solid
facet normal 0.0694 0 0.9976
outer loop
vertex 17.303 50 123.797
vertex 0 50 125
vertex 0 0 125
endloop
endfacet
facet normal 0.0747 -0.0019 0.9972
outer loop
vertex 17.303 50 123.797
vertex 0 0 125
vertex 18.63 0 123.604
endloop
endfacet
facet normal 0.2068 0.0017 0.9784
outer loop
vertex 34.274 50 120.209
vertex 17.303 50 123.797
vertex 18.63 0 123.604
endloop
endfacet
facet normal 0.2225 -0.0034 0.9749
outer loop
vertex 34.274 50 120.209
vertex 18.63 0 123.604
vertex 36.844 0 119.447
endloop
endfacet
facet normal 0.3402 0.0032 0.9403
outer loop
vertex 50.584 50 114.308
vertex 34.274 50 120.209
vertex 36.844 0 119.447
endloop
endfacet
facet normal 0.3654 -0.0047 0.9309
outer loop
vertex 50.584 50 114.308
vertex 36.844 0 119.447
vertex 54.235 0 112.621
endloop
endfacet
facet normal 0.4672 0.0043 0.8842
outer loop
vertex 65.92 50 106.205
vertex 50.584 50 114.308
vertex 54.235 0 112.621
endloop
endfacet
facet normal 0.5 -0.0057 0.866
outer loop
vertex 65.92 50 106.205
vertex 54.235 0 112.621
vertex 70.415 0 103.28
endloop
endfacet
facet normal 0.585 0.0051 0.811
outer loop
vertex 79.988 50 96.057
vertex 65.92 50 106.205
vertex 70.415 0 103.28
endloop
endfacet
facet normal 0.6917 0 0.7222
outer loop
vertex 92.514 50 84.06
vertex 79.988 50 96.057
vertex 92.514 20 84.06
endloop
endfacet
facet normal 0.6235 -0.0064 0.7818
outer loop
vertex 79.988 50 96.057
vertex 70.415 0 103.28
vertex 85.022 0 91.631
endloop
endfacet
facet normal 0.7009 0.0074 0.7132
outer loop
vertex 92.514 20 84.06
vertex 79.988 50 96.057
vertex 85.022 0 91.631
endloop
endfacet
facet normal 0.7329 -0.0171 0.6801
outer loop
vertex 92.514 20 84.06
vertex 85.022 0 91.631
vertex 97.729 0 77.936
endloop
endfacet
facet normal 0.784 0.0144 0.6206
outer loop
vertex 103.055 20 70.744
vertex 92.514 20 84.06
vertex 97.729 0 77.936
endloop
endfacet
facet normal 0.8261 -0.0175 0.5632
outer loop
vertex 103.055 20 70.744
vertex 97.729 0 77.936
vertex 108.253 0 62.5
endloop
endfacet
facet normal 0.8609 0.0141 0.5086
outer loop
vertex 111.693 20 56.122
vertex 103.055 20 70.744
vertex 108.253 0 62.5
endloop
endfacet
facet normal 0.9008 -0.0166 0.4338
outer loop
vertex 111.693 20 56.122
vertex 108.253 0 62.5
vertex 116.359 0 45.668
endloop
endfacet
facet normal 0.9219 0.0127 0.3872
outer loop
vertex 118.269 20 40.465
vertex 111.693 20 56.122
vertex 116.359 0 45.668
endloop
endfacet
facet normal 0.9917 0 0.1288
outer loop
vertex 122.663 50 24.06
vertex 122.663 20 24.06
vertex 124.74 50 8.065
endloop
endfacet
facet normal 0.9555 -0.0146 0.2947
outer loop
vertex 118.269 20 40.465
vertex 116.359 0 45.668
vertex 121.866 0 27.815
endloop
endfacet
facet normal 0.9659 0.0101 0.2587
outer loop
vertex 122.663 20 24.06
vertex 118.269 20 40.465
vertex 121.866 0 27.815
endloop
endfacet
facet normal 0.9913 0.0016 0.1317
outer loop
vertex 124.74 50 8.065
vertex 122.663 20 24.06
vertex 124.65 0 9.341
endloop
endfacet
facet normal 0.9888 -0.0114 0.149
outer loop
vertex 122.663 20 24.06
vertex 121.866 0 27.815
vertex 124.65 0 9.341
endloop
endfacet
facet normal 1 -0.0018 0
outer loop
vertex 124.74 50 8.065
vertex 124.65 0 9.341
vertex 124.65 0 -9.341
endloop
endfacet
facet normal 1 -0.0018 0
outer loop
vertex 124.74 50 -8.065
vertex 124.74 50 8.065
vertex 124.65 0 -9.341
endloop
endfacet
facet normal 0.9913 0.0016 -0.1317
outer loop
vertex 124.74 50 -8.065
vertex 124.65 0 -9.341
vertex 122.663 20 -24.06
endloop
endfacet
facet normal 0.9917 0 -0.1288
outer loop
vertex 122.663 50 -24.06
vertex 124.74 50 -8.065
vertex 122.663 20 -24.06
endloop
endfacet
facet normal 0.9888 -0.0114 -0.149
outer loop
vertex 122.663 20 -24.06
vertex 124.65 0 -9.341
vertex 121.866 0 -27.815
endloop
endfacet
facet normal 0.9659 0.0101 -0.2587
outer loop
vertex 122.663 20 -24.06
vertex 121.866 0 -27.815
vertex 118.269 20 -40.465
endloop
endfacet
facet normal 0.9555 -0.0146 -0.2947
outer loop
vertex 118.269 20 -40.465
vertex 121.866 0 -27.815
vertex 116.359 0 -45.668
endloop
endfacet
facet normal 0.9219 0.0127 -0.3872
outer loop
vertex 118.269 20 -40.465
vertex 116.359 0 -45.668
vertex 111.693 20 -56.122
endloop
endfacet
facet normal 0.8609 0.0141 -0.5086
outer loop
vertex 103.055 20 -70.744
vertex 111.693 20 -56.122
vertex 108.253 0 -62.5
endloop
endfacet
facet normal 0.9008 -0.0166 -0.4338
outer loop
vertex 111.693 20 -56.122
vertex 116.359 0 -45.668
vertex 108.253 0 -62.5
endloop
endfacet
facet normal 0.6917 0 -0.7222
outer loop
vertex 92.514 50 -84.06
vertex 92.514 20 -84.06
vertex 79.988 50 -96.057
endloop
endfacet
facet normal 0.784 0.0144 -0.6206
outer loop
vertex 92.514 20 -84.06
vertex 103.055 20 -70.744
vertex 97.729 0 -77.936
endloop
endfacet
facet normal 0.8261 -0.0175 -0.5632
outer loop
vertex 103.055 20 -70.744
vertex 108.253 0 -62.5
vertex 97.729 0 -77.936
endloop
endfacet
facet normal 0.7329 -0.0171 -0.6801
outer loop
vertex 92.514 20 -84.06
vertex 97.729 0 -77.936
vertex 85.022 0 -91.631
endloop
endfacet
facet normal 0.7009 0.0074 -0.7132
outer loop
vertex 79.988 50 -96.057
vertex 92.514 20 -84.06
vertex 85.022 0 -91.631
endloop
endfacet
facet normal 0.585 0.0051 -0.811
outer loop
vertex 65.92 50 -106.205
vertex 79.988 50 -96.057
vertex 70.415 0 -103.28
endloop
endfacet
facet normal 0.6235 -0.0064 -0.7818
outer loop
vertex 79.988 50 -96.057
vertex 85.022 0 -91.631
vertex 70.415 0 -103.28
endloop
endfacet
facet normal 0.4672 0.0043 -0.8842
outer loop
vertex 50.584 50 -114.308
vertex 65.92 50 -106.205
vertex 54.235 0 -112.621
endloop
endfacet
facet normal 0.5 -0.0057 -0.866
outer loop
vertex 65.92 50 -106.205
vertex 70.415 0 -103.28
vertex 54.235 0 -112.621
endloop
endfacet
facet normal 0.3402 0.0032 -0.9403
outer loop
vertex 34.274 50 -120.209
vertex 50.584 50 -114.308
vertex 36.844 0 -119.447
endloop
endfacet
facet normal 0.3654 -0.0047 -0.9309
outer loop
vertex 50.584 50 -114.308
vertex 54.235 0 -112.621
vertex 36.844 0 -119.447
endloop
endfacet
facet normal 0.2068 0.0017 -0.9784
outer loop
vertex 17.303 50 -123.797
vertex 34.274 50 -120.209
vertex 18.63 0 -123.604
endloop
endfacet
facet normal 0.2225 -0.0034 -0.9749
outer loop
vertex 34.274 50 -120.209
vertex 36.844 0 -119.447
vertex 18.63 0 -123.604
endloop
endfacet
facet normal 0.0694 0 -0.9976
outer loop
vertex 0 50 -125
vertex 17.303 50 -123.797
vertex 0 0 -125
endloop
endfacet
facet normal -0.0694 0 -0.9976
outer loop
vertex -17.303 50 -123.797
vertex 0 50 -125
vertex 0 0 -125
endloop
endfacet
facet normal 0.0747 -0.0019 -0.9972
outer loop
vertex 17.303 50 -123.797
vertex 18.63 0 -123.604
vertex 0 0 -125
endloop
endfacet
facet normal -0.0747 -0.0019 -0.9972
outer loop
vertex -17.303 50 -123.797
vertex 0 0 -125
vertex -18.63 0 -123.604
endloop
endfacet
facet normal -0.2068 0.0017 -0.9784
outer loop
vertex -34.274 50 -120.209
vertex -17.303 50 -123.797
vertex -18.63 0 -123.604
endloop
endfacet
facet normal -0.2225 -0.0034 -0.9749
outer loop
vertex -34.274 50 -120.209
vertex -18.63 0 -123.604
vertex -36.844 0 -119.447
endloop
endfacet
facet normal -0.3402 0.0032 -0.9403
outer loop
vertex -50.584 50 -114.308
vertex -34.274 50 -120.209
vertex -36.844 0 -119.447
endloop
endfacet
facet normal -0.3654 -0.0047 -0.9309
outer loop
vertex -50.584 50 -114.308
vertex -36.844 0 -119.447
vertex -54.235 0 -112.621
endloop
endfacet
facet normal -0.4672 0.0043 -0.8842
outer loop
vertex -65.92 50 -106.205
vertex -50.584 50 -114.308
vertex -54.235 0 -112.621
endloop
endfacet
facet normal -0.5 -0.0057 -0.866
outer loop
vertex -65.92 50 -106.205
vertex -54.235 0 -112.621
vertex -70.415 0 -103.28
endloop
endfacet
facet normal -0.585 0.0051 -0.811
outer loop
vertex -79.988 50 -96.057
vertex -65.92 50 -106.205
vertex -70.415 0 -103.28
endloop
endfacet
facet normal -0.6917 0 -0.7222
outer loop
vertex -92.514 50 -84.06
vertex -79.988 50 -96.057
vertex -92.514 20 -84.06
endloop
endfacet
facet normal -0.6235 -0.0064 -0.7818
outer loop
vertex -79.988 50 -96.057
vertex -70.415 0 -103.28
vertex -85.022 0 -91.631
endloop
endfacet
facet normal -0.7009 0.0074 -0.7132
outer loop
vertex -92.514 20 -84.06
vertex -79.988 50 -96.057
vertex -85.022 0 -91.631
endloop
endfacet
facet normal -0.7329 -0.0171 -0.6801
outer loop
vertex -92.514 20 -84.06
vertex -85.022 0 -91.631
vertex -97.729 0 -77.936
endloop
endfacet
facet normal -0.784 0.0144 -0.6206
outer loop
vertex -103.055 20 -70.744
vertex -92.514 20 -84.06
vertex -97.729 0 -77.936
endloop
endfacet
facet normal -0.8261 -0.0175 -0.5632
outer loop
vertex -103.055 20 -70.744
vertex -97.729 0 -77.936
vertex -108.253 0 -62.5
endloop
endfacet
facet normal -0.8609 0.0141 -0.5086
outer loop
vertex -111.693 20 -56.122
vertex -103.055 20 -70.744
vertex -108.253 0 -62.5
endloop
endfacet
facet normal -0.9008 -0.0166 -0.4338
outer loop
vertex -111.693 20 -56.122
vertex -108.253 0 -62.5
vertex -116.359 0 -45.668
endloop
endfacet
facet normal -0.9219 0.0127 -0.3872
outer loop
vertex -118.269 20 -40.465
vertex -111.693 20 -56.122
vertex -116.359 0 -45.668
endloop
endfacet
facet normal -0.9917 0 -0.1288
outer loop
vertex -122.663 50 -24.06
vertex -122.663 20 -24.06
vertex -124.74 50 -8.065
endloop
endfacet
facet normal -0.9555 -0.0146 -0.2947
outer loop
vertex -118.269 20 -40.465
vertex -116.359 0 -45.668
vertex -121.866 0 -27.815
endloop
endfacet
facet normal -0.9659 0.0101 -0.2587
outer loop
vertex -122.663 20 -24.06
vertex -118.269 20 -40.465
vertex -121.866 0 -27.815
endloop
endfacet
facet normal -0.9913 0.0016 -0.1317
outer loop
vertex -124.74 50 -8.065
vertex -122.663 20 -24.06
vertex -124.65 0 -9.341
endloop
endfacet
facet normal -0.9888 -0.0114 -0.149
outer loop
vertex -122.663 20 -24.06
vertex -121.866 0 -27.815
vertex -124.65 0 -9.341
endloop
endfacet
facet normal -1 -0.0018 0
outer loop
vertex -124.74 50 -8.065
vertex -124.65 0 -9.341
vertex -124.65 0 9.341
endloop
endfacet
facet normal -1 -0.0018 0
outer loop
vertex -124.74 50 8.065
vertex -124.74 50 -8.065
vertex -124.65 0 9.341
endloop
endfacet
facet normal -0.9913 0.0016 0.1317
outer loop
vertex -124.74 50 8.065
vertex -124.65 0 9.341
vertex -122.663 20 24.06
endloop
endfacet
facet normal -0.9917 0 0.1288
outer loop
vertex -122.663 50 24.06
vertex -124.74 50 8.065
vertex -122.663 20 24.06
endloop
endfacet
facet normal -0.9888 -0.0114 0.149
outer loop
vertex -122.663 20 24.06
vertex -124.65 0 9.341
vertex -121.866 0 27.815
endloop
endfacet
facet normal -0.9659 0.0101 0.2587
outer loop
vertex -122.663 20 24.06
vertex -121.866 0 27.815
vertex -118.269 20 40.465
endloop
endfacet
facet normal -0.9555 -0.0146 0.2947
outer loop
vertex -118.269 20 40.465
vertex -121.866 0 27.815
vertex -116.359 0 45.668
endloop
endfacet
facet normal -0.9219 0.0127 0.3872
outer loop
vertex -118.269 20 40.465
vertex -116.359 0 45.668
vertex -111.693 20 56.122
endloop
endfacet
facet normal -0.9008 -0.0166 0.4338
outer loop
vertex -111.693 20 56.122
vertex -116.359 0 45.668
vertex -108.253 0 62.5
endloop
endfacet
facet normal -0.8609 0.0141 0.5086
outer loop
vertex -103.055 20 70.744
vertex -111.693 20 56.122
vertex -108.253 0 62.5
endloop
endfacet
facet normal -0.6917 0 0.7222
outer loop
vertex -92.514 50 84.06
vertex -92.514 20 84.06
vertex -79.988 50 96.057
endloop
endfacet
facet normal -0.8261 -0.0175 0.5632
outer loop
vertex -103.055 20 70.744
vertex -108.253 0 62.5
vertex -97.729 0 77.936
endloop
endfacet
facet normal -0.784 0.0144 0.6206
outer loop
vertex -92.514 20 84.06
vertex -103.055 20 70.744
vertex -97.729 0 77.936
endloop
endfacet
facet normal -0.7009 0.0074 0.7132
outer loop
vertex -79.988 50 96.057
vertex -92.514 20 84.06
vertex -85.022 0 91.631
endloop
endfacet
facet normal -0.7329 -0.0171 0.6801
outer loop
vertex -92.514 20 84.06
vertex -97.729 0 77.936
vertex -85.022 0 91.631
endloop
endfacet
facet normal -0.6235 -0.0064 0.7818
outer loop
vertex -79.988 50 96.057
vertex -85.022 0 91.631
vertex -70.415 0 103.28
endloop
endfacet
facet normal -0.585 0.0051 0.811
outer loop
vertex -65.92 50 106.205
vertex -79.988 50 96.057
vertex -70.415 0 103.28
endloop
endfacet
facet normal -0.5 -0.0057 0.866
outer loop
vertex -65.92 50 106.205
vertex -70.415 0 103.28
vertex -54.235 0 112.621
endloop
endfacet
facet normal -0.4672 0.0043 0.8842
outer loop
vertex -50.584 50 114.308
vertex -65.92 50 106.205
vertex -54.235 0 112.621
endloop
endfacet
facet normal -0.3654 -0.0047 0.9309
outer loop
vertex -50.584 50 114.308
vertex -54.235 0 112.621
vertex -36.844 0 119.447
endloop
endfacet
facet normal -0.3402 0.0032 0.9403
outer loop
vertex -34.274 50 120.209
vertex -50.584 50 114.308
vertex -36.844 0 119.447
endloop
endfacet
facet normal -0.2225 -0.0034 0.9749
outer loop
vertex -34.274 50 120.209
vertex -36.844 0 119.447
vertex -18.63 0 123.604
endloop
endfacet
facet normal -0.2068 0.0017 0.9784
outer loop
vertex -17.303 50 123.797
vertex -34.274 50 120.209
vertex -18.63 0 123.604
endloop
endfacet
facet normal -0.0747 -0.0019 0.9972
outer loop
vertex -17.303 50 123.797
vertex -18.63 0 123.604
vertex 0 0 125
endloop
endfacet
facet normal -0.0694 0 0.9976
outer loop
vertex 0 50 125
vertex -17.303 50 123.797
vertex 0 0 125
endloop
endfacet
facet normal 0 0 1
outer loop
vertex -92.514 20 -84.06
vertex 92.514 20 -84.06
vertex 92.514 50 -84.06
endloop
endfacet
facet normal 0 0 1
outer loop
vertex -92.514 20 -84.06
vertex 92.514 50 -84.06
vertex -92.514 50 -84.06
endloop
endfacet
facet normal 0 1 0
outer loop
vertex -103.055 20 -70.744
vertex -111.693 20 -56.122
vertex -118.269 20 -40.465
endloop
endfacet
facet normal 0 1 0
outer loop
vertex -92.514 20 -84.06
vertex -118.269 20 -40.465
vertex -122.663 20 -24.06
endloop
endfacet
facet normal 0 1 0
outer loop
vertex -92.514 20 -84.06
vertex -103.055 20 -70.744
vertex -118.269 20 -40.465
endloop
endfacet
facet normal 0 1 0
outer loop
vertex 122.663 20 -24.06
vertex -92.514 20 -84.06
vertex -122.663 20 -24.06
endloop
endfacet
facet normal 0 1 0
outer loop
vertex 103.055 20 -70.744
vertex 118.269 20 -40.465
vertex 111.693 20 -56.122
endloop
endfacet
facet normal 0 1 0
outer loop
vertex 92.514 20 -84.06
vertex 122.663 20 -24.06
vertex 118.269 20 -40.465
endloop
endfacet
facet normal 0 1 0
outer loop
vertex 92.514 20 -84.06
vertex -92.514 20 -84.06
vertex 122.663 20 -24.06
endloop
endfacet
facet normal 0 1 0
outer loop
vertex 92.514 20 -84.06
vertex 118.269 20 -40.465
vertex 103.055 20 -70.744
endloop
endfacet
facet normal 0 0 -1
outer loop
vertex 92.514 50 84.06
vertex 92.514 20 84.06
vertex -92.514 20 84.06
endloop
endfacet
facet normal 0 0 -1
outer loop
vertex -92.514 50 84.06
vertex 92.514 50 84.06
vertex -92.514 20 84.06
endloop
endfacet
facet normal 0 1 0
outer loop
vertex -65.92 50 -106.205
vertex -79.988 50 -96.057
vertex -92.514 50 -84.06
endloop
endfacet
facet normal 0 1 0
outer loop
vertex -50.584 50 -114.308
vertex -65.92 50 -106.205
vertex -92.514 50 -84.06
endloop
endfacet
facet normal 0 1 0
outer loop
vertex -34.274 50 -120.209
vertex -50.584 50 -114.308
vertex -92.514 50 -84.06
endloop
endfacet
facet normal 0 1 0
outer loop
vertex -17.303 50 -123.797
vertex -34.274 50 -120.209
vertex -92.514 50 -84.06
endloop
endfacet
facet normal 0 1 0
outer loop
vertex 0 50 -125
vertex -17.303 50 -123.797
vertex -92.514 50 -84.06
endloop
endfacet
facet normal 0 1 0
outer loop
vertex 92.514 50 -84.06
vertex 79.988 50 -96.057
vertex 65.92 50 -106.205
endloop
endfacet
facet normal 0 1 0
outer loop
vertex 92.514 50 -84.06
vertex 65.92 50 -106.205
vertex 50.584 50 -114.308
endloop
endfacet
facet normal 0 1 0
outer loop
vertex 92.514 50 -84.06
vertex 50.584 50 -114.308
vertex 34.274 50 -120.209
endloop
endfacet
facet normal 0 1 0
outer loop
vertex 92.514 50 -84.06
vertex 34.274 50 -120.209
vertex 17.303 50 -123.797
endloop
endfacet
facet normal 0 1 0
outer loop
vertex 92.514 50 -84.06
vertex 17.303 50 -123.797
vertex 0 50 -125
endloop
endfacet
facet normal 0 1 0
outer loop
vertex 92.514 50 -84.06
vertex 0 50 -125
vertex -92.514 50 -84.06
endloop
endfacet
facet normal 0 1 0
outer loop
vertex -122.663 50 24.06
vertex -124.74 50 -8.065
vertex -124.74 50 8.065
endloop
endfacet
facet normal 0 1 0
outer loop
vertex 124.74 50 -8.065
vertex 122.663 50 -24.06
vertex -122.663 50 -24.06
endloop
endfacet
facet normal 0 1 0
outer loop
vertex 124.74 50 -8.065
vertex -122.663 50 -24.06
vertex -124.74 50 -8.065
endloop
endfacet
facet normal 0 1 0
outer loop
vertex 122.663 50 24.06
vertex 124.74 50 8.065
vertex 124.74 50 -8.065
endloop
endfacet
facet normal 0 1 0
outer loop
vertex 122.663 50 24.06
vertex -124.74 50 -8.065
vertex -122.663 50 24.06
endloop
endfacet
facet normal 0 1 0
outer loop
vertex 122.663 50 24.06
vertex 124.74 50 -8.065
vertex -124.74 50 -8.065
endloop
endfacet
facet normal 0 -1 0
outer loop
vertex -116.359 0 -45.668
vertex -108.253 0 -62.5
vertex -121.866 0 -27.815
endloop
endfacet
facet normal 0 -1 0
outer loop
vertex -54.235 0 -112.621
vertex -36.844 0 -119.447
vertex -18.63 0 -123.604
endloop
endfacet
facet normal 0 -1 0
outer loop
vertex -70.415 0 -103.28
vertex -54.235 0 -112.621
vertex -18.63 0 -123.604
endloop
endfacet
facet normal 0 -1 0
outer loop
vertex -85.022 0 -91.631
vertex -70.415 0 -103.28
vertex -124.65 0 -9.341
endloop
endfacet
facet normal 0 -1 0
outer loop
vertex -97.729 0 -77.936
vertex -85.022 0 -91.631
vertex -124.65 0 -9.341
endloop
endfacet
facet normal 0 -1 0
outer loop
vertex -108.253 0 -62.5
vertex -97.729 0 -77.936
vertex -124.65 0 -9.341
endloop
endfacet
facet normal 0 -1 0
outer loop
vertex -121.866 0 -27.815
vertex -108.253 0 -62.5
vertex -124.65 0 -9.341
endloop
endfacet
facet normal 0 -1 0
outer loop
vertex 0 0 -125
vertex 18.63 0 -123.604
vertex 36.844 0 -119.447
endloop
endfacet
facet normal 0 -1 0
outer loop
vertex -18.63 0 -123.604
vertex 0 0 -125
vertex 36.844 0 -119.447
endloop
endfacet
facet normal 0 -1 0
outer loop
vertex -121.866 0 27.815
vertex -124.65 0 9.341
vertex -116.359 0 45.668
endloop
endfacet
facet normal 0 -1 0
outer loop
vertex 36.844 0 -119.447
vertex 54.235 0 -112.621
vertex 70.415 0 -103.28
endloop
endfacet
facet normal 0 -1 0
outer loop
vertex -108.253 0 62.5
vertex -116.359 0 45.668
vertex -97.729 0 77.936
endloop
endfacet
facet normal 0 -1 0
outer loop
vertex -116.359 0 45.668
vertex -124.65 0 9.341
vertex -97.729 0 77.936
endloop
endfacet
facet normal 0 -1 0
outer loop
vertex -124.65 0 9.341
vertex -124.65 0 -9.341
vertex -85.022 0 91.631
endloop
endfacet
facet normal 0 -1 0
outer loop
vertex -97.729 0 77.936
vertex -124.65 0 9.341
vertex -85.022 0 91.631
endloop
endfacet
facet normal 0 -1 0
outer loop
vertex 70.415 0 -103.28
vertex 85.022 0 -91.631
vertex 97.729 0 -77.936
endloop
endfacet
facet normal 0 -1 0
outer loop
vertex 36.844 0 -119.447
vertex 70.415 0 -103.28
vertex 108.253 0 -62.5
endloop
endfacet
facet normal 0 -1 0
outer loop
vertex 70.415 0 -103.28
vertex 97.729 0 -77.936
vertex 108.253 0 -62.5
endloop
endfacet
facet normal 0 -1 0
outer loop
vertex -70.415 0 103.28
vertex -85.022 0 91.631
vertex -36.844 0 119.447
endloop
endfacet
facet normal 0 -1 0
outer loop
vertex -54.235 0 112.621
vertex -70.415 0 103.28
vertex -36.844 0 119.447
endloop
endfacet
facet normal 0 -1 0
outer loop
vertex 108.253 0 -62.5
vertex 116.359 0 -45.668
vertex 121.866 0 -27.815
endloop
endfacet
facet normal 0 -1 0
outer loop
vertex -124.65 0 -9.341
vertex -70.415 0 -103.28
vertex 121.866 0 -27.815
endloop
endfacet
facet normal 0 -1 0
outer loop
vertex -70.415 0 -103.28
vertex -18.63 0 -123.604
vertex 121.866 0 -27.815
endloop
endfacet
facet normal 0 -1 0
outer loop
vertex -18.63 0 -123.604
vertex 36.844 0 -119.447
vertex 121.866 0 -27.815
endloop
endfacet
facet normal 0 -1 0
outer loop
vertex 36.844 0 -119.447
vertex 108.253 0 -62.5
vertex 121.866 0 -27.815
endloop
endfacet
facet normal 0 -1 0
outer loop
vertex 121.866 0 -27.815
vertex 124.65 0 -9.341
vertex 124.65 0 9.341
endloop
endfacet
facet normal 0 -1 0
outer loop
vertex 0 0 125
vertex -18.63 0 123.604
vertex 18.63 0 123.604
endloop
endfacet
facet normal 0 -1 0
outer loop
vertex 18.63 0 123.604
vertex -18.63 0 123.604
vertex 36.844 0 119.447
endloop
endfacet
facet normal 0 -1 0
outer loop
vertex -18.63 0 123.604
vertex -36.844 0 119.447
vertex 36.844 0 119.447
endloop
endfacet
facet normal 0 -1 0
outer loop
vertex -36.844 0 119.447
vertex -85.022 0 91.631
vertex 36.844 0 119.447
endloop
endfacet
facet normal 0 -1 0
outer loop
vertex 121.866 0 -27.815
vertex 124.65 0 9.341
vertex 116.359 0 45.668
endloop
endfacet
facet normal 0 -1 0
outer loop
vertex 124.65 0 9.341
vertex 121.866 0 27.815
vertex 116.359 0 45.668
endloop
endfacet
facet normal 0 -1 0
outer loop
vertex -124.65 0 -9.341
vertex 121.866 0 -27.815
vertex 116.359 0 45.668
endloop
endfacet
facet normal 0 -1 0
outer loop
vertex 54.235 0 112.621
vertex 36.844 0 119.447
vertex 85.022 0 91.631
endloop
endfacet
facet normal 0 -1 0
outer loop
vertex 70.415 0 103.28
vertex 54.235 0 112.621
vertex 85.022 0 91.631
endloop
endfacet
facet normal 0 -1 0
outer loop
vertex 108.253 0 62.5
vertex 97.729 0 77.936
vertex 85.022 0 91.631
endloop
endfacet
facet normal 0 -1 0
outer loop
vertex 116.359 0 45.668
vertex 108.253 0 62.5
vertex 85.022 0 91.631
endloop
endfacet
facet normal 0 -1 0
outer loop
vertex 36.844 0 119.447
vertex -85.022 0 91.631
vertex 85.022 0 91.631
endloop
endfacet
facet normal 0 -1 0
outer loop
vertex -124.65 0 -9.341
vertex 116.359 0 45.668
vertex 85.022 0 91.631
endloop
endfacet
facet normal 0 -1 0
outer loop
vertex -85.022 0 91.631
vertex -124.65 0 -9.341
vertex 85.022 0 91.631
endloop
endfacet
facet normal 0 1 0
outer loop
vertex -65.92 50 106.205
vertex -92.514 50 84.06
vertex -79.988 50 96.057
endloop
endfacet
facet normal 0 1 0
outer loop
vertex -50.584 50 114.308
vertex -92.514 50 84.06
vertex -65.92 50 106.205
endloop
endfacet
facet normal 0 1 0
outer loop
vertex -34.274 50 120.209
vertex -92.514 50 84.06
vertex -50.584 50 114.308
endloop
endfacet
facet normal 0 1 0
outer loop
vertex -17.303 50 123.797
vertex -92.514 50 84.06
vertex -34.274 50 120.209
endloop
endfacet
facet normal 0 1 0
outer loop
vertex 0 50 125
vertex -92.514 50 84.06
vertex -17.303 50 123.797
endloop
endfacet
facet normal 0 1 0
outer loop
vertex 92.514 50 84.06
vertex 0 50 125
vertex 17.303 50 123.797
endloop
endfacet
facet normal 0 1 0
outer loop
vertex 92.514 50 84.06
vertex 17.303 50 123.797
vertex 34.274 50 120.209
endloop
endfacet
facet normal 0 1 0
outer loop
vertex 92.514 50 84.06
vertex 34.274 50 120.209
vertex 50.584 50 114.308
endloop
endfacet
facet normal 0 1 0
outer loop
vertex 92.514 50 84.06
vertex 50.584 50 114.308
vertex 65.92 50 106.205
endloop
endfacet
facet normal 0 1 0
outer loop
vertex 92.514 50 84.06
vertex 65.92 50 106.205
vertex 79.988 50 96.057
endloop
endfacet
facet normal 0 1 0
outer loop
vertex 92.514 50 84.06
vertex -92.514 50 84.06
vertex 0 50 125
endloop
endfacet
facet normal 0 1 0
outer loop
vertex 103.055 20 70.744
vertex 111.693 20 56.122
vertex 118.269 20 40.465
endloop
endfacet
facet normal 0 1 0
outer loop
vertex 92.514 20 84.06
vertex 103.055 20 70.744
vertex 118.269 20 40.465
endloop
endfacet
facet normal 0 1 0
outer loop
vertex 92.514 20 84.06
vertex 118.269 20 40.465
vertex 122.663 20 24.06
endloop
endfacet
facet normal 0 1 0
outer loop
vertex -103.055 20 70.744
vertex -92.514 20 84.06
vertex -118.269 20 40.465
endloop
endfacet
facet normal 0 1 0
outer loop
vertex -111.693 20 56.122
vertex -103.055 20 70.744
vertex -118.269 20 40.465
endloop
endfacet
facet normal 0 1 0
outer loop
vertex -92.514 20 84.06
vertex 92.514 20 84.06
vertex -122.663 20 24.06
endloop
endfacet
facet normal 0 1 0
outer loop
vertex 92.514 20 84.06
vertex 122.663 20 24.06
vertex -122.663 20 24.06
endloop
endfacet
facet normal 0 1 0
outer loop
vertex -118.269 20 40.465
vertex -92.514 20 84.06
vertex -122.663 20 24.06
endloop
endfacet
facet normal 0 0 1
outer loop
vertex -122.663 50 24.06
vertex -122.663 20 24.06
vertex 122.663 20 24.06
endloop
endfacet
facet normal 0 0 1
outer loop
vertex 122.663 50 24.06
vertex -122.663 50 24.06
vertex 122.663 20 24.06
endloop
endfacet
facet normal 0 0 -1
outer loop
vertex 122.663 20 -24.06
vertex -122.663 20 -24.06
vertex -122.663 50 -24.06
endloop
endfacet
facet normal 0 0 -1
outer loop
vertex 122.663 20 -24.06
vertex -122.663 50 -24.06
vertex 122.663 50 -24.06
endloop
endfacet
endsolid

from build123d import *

# Parameters (mm, degrees)
SKETCH2_R           = 125
BOSS_EXTRUDE1_DEPTH = 50
CUT_EXTRUDE1_START  = -30
CUT_EXTRUDE1_DEPTH  = 30


with BuildPart() as part:
    # Sketch2 → Boss-Extrude1 (new body)
    with BuildSketch(Plane(origin=(0, 0, 0), x_dir=(1, 0, 0), z_dir=(0, 1, 0))):
        with Locations(Location((0, 0, 0), (0, 0, 270))):
            Circle(SKETCH2_R)
    extrude(amount=BOSS_EXTRUDE1_DEPTH)

    # Sketch3 → Cut-Extrude1 (cut)
    with BuildSketch(Plane(origin=(0, 50, 0), x_dir=(1, 0, 0), z_dir=(0, 1, 0)).offset(CUT_EXTRUDE1_START)):
        with BuildLine():
            Line((-122.662612071, 24.06), (122.662612071, 24.06))
            ThreePointArc((122.662612071, 24.06), (111.692828355, 56.122295874), (92.51441185, 84.06))
            Line((92.51441185, 84.06), (-92.51441185, 84.06))
            ThreePointArc((-92.51441185, 84.06), (-111.692828355, 56.122295874), (-122.662612071, 24.06))
        make_face()
        with BuildLine():
            Line((-122.662612071, -24.06), (122.662612071, -24.06))
            ThreePointArc((122.662612071, -24.06), (111.692828355, -56.122295874), (92.51441185, -84.06))
            Line((92.51441185, -84.06), (-92.51441185, -84.06))
            ThreePointArc((-92.51441185, -84.06), (-111.692828355, -56.122295874), (-122.662612071, -24.06))
        make_face()
    extrude(amount=CUT_EXTRUDE1_DEPTH, mode=Mode.SUBTRACT)


solid = part.part
